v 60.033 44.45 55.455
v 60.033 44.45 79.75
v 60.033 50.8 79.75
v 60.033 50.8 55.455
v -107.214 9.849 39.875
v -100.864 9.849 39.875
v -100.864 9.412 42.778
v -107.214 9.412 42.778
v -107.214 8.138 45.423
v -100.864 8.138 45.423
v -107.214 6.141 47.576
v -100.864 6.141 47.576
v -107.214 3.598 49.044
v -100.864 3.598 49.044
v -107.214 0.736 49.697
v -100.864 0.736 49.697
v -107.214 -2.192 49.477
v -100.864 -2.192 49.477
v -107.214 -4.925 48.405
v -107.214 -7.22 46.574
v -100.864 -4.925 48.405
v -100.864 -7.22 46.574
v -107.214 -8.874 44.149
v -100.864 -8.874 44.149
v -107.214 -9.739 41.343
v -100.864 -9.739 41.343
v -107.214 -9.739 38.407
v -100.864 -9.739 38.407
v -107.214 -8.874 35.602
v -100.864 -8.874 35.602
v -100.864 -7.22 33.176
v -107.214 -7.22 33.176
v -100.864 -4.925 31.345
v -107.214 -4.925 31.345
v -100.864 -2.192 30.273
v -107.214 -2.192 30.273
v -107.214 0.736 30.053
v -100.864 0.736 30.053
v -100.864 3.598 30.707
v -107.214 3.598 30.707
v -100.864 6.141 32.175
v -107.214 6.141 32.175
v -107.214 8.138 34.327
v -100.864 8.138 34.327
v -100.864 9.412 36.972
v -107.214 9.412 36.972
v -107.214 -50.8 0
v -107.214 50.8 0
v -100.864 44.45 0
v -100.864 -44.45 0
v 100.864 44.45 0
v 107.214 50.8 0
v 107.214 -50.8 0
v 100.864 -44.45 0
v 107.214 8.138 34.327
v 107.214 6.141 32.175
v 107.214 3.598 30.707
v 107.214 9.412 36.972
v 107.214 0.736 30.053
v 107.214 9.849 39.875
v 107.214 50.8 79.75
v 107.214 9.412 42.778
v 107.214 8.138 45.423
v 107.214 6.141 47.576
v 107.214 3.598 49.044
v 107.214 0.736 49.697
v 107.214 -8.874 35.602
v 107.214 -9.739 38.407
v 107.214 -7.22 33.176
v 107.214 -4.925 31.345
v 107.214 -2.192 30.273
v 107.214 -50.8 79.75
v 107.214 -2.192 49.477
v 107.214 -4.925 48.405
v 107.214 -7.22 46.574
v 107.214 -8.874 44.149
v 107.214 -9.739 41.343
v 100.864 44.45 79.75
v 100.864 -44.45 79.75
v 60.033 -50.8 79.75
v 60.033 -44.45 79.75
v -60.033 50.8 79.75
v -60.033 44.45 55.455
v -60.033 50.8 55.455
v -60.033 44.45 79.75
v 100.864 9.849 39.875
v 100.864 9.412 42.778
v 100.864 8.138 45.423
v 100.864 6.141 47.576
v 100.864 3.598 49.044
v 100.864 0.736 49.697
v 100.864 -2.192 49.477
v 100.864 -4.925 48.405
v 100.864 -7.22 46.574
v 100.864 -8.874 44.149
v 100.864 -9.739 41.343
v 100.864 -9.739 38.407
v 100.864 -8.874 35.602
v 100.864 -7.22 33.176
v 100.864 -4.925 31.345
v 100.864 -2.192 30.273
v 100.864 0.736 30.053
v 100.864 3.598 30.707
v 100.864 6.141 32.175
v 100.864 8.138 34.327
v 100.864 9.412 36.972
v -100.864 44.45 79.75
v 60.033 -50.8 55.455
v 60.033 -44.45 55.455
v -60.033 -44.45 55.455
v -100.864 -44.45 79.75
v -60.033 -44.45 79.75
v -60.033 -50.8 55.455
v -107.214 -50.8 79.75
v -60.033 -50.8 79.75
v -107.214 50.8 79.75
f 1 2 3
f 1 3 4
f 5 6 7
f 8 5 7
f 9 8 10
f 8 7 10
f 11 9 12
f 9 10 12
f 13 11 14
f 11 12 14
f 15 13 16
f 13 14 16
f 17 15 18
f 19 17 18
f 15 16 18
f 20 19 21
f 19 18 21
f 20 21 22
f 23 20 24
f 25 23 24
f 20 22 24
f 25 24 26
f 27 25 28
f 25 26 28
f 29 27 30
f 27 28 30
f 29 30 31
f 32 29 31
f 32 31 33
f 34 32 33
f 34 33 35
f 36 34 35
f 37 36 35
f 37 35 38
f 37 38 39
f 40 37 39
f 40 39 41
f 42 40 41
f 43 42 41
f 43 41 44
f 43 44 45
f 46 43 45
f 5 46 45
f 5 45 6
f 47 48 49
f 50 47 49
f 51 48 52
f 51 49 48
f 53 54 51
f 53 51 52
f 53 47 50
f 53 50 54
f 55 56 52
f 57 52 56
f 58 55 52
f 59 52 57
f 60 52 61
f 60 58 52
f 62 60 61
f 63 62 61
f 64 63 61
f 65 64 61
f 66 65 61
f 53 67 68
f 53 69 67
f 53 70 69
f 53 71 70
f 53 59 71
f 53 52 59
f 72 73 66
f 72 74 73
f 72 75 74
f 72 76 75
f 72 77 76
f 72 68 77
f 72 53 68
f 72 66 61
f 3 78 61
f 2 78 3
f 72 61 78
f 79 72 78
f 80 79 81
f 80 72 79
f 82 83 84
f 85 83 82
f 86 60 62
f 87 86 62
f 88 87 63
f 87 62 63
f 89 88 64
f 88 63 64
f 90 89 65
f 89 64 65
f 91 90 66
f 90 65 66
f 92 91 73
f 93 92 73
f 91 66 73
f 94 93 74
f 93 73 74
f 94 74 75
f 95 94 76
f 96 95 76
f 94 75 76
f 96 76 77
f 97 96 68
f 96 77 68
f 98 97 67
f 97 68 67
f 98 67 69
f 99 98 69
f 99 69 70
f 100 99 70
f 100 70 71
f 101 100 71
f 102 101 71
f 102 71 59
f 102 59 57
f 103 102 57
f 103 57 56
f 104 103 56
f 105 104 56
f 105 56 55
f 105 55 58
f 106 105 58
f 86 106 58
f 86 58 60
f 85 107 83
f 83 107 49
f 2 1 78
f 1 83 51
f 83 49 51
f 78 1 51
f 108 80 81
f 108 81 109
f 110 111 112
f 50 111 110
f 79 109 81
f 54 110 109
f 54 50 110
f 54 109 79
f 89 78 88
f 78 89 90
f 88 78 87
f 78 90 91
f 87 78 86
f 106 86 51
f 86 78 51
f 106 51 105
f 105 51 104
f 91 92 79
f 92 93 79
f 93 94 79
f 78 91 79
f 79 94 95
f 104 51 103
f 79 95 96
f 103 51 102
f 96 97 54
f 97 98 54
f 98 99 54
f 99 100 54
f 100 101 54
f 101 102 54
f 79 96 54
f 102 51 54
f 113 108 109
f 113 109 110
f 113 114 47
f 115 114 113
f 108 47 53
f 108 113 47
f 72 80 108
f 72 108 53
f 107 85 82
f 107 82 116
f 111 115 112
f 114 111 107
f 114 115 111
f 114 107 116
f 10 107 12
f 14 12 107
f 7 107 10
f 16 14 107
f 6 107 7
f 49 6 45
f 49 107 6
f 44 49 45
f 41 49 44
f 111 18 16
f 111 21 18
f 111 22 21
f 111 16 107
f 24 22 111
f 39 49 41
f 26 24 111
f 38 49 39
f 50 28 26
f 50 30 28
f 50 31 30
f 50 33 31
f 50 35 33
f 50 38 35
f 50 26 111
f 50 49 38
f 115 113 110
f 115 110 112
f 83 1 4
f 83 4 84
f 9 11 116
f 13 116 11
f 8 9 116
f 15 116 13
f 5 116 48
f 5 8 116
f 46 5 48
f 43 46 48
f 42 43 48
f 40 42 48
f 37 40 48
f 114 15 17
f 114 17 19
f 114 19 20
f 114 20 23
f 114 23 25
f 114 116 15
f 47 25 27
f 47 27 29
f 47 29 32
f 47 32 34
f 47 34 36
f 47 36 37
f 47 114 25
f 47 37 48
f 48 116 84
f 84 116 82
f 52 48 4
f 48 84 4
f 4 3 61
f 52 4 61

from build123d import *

# Parameters (mm, degrees)
F1_DEPTH      = 50.8
F1_DEPTH_BACK = 50.8
F2_R          = 9.849318
F3_DEPTH      = 214.428754
F4_W          = 201.727754
F4_H          = 88.9
F5_DEPTH      = 79.751232


with BuildPart() as f1:
    # F0 (on Front) → F1 (new body, two sides)
    with BuildSketch(Plane.XZ) as f1_sk:
        Polygon((-107.213877, 0), (0, 0), (107.213877, 0), (107.213877, 79.750232), (60.032729, 79.750232), (60.032729, 55.455457), (0, 55.455457), (-60.032729, 55.455457), (-60.032729, 79.750232), (-107.213877, 79.750232), align=None)
    extrude(amount=F1_DEPTH)
    extrude(f1_sk.sketch, amount=-F1_DEPTH_BACK)

    # F2 (on face) → F3 (cut, through all)
    with BuildSketch(Plane.YZ.offset(107.213877)):
        with Locations((0, 39.875116)):
            Circle(F2_R)
    extrude(amount=-F3_DEPTH, mode=Mode.SUBTRACT)

    # F4 (on face) → F5 (cut, through all)
    with BuildSketch(Plane(origin=(0, 0, 0), x_dir=(1, 0, 0), z_dir=(0, 0, -1))):
        Rectangle(F4_W, F4_H)
    extrude(amount=-F5_DEPTH, mode=Mode.SUBTRACT)


solid = f1.part
